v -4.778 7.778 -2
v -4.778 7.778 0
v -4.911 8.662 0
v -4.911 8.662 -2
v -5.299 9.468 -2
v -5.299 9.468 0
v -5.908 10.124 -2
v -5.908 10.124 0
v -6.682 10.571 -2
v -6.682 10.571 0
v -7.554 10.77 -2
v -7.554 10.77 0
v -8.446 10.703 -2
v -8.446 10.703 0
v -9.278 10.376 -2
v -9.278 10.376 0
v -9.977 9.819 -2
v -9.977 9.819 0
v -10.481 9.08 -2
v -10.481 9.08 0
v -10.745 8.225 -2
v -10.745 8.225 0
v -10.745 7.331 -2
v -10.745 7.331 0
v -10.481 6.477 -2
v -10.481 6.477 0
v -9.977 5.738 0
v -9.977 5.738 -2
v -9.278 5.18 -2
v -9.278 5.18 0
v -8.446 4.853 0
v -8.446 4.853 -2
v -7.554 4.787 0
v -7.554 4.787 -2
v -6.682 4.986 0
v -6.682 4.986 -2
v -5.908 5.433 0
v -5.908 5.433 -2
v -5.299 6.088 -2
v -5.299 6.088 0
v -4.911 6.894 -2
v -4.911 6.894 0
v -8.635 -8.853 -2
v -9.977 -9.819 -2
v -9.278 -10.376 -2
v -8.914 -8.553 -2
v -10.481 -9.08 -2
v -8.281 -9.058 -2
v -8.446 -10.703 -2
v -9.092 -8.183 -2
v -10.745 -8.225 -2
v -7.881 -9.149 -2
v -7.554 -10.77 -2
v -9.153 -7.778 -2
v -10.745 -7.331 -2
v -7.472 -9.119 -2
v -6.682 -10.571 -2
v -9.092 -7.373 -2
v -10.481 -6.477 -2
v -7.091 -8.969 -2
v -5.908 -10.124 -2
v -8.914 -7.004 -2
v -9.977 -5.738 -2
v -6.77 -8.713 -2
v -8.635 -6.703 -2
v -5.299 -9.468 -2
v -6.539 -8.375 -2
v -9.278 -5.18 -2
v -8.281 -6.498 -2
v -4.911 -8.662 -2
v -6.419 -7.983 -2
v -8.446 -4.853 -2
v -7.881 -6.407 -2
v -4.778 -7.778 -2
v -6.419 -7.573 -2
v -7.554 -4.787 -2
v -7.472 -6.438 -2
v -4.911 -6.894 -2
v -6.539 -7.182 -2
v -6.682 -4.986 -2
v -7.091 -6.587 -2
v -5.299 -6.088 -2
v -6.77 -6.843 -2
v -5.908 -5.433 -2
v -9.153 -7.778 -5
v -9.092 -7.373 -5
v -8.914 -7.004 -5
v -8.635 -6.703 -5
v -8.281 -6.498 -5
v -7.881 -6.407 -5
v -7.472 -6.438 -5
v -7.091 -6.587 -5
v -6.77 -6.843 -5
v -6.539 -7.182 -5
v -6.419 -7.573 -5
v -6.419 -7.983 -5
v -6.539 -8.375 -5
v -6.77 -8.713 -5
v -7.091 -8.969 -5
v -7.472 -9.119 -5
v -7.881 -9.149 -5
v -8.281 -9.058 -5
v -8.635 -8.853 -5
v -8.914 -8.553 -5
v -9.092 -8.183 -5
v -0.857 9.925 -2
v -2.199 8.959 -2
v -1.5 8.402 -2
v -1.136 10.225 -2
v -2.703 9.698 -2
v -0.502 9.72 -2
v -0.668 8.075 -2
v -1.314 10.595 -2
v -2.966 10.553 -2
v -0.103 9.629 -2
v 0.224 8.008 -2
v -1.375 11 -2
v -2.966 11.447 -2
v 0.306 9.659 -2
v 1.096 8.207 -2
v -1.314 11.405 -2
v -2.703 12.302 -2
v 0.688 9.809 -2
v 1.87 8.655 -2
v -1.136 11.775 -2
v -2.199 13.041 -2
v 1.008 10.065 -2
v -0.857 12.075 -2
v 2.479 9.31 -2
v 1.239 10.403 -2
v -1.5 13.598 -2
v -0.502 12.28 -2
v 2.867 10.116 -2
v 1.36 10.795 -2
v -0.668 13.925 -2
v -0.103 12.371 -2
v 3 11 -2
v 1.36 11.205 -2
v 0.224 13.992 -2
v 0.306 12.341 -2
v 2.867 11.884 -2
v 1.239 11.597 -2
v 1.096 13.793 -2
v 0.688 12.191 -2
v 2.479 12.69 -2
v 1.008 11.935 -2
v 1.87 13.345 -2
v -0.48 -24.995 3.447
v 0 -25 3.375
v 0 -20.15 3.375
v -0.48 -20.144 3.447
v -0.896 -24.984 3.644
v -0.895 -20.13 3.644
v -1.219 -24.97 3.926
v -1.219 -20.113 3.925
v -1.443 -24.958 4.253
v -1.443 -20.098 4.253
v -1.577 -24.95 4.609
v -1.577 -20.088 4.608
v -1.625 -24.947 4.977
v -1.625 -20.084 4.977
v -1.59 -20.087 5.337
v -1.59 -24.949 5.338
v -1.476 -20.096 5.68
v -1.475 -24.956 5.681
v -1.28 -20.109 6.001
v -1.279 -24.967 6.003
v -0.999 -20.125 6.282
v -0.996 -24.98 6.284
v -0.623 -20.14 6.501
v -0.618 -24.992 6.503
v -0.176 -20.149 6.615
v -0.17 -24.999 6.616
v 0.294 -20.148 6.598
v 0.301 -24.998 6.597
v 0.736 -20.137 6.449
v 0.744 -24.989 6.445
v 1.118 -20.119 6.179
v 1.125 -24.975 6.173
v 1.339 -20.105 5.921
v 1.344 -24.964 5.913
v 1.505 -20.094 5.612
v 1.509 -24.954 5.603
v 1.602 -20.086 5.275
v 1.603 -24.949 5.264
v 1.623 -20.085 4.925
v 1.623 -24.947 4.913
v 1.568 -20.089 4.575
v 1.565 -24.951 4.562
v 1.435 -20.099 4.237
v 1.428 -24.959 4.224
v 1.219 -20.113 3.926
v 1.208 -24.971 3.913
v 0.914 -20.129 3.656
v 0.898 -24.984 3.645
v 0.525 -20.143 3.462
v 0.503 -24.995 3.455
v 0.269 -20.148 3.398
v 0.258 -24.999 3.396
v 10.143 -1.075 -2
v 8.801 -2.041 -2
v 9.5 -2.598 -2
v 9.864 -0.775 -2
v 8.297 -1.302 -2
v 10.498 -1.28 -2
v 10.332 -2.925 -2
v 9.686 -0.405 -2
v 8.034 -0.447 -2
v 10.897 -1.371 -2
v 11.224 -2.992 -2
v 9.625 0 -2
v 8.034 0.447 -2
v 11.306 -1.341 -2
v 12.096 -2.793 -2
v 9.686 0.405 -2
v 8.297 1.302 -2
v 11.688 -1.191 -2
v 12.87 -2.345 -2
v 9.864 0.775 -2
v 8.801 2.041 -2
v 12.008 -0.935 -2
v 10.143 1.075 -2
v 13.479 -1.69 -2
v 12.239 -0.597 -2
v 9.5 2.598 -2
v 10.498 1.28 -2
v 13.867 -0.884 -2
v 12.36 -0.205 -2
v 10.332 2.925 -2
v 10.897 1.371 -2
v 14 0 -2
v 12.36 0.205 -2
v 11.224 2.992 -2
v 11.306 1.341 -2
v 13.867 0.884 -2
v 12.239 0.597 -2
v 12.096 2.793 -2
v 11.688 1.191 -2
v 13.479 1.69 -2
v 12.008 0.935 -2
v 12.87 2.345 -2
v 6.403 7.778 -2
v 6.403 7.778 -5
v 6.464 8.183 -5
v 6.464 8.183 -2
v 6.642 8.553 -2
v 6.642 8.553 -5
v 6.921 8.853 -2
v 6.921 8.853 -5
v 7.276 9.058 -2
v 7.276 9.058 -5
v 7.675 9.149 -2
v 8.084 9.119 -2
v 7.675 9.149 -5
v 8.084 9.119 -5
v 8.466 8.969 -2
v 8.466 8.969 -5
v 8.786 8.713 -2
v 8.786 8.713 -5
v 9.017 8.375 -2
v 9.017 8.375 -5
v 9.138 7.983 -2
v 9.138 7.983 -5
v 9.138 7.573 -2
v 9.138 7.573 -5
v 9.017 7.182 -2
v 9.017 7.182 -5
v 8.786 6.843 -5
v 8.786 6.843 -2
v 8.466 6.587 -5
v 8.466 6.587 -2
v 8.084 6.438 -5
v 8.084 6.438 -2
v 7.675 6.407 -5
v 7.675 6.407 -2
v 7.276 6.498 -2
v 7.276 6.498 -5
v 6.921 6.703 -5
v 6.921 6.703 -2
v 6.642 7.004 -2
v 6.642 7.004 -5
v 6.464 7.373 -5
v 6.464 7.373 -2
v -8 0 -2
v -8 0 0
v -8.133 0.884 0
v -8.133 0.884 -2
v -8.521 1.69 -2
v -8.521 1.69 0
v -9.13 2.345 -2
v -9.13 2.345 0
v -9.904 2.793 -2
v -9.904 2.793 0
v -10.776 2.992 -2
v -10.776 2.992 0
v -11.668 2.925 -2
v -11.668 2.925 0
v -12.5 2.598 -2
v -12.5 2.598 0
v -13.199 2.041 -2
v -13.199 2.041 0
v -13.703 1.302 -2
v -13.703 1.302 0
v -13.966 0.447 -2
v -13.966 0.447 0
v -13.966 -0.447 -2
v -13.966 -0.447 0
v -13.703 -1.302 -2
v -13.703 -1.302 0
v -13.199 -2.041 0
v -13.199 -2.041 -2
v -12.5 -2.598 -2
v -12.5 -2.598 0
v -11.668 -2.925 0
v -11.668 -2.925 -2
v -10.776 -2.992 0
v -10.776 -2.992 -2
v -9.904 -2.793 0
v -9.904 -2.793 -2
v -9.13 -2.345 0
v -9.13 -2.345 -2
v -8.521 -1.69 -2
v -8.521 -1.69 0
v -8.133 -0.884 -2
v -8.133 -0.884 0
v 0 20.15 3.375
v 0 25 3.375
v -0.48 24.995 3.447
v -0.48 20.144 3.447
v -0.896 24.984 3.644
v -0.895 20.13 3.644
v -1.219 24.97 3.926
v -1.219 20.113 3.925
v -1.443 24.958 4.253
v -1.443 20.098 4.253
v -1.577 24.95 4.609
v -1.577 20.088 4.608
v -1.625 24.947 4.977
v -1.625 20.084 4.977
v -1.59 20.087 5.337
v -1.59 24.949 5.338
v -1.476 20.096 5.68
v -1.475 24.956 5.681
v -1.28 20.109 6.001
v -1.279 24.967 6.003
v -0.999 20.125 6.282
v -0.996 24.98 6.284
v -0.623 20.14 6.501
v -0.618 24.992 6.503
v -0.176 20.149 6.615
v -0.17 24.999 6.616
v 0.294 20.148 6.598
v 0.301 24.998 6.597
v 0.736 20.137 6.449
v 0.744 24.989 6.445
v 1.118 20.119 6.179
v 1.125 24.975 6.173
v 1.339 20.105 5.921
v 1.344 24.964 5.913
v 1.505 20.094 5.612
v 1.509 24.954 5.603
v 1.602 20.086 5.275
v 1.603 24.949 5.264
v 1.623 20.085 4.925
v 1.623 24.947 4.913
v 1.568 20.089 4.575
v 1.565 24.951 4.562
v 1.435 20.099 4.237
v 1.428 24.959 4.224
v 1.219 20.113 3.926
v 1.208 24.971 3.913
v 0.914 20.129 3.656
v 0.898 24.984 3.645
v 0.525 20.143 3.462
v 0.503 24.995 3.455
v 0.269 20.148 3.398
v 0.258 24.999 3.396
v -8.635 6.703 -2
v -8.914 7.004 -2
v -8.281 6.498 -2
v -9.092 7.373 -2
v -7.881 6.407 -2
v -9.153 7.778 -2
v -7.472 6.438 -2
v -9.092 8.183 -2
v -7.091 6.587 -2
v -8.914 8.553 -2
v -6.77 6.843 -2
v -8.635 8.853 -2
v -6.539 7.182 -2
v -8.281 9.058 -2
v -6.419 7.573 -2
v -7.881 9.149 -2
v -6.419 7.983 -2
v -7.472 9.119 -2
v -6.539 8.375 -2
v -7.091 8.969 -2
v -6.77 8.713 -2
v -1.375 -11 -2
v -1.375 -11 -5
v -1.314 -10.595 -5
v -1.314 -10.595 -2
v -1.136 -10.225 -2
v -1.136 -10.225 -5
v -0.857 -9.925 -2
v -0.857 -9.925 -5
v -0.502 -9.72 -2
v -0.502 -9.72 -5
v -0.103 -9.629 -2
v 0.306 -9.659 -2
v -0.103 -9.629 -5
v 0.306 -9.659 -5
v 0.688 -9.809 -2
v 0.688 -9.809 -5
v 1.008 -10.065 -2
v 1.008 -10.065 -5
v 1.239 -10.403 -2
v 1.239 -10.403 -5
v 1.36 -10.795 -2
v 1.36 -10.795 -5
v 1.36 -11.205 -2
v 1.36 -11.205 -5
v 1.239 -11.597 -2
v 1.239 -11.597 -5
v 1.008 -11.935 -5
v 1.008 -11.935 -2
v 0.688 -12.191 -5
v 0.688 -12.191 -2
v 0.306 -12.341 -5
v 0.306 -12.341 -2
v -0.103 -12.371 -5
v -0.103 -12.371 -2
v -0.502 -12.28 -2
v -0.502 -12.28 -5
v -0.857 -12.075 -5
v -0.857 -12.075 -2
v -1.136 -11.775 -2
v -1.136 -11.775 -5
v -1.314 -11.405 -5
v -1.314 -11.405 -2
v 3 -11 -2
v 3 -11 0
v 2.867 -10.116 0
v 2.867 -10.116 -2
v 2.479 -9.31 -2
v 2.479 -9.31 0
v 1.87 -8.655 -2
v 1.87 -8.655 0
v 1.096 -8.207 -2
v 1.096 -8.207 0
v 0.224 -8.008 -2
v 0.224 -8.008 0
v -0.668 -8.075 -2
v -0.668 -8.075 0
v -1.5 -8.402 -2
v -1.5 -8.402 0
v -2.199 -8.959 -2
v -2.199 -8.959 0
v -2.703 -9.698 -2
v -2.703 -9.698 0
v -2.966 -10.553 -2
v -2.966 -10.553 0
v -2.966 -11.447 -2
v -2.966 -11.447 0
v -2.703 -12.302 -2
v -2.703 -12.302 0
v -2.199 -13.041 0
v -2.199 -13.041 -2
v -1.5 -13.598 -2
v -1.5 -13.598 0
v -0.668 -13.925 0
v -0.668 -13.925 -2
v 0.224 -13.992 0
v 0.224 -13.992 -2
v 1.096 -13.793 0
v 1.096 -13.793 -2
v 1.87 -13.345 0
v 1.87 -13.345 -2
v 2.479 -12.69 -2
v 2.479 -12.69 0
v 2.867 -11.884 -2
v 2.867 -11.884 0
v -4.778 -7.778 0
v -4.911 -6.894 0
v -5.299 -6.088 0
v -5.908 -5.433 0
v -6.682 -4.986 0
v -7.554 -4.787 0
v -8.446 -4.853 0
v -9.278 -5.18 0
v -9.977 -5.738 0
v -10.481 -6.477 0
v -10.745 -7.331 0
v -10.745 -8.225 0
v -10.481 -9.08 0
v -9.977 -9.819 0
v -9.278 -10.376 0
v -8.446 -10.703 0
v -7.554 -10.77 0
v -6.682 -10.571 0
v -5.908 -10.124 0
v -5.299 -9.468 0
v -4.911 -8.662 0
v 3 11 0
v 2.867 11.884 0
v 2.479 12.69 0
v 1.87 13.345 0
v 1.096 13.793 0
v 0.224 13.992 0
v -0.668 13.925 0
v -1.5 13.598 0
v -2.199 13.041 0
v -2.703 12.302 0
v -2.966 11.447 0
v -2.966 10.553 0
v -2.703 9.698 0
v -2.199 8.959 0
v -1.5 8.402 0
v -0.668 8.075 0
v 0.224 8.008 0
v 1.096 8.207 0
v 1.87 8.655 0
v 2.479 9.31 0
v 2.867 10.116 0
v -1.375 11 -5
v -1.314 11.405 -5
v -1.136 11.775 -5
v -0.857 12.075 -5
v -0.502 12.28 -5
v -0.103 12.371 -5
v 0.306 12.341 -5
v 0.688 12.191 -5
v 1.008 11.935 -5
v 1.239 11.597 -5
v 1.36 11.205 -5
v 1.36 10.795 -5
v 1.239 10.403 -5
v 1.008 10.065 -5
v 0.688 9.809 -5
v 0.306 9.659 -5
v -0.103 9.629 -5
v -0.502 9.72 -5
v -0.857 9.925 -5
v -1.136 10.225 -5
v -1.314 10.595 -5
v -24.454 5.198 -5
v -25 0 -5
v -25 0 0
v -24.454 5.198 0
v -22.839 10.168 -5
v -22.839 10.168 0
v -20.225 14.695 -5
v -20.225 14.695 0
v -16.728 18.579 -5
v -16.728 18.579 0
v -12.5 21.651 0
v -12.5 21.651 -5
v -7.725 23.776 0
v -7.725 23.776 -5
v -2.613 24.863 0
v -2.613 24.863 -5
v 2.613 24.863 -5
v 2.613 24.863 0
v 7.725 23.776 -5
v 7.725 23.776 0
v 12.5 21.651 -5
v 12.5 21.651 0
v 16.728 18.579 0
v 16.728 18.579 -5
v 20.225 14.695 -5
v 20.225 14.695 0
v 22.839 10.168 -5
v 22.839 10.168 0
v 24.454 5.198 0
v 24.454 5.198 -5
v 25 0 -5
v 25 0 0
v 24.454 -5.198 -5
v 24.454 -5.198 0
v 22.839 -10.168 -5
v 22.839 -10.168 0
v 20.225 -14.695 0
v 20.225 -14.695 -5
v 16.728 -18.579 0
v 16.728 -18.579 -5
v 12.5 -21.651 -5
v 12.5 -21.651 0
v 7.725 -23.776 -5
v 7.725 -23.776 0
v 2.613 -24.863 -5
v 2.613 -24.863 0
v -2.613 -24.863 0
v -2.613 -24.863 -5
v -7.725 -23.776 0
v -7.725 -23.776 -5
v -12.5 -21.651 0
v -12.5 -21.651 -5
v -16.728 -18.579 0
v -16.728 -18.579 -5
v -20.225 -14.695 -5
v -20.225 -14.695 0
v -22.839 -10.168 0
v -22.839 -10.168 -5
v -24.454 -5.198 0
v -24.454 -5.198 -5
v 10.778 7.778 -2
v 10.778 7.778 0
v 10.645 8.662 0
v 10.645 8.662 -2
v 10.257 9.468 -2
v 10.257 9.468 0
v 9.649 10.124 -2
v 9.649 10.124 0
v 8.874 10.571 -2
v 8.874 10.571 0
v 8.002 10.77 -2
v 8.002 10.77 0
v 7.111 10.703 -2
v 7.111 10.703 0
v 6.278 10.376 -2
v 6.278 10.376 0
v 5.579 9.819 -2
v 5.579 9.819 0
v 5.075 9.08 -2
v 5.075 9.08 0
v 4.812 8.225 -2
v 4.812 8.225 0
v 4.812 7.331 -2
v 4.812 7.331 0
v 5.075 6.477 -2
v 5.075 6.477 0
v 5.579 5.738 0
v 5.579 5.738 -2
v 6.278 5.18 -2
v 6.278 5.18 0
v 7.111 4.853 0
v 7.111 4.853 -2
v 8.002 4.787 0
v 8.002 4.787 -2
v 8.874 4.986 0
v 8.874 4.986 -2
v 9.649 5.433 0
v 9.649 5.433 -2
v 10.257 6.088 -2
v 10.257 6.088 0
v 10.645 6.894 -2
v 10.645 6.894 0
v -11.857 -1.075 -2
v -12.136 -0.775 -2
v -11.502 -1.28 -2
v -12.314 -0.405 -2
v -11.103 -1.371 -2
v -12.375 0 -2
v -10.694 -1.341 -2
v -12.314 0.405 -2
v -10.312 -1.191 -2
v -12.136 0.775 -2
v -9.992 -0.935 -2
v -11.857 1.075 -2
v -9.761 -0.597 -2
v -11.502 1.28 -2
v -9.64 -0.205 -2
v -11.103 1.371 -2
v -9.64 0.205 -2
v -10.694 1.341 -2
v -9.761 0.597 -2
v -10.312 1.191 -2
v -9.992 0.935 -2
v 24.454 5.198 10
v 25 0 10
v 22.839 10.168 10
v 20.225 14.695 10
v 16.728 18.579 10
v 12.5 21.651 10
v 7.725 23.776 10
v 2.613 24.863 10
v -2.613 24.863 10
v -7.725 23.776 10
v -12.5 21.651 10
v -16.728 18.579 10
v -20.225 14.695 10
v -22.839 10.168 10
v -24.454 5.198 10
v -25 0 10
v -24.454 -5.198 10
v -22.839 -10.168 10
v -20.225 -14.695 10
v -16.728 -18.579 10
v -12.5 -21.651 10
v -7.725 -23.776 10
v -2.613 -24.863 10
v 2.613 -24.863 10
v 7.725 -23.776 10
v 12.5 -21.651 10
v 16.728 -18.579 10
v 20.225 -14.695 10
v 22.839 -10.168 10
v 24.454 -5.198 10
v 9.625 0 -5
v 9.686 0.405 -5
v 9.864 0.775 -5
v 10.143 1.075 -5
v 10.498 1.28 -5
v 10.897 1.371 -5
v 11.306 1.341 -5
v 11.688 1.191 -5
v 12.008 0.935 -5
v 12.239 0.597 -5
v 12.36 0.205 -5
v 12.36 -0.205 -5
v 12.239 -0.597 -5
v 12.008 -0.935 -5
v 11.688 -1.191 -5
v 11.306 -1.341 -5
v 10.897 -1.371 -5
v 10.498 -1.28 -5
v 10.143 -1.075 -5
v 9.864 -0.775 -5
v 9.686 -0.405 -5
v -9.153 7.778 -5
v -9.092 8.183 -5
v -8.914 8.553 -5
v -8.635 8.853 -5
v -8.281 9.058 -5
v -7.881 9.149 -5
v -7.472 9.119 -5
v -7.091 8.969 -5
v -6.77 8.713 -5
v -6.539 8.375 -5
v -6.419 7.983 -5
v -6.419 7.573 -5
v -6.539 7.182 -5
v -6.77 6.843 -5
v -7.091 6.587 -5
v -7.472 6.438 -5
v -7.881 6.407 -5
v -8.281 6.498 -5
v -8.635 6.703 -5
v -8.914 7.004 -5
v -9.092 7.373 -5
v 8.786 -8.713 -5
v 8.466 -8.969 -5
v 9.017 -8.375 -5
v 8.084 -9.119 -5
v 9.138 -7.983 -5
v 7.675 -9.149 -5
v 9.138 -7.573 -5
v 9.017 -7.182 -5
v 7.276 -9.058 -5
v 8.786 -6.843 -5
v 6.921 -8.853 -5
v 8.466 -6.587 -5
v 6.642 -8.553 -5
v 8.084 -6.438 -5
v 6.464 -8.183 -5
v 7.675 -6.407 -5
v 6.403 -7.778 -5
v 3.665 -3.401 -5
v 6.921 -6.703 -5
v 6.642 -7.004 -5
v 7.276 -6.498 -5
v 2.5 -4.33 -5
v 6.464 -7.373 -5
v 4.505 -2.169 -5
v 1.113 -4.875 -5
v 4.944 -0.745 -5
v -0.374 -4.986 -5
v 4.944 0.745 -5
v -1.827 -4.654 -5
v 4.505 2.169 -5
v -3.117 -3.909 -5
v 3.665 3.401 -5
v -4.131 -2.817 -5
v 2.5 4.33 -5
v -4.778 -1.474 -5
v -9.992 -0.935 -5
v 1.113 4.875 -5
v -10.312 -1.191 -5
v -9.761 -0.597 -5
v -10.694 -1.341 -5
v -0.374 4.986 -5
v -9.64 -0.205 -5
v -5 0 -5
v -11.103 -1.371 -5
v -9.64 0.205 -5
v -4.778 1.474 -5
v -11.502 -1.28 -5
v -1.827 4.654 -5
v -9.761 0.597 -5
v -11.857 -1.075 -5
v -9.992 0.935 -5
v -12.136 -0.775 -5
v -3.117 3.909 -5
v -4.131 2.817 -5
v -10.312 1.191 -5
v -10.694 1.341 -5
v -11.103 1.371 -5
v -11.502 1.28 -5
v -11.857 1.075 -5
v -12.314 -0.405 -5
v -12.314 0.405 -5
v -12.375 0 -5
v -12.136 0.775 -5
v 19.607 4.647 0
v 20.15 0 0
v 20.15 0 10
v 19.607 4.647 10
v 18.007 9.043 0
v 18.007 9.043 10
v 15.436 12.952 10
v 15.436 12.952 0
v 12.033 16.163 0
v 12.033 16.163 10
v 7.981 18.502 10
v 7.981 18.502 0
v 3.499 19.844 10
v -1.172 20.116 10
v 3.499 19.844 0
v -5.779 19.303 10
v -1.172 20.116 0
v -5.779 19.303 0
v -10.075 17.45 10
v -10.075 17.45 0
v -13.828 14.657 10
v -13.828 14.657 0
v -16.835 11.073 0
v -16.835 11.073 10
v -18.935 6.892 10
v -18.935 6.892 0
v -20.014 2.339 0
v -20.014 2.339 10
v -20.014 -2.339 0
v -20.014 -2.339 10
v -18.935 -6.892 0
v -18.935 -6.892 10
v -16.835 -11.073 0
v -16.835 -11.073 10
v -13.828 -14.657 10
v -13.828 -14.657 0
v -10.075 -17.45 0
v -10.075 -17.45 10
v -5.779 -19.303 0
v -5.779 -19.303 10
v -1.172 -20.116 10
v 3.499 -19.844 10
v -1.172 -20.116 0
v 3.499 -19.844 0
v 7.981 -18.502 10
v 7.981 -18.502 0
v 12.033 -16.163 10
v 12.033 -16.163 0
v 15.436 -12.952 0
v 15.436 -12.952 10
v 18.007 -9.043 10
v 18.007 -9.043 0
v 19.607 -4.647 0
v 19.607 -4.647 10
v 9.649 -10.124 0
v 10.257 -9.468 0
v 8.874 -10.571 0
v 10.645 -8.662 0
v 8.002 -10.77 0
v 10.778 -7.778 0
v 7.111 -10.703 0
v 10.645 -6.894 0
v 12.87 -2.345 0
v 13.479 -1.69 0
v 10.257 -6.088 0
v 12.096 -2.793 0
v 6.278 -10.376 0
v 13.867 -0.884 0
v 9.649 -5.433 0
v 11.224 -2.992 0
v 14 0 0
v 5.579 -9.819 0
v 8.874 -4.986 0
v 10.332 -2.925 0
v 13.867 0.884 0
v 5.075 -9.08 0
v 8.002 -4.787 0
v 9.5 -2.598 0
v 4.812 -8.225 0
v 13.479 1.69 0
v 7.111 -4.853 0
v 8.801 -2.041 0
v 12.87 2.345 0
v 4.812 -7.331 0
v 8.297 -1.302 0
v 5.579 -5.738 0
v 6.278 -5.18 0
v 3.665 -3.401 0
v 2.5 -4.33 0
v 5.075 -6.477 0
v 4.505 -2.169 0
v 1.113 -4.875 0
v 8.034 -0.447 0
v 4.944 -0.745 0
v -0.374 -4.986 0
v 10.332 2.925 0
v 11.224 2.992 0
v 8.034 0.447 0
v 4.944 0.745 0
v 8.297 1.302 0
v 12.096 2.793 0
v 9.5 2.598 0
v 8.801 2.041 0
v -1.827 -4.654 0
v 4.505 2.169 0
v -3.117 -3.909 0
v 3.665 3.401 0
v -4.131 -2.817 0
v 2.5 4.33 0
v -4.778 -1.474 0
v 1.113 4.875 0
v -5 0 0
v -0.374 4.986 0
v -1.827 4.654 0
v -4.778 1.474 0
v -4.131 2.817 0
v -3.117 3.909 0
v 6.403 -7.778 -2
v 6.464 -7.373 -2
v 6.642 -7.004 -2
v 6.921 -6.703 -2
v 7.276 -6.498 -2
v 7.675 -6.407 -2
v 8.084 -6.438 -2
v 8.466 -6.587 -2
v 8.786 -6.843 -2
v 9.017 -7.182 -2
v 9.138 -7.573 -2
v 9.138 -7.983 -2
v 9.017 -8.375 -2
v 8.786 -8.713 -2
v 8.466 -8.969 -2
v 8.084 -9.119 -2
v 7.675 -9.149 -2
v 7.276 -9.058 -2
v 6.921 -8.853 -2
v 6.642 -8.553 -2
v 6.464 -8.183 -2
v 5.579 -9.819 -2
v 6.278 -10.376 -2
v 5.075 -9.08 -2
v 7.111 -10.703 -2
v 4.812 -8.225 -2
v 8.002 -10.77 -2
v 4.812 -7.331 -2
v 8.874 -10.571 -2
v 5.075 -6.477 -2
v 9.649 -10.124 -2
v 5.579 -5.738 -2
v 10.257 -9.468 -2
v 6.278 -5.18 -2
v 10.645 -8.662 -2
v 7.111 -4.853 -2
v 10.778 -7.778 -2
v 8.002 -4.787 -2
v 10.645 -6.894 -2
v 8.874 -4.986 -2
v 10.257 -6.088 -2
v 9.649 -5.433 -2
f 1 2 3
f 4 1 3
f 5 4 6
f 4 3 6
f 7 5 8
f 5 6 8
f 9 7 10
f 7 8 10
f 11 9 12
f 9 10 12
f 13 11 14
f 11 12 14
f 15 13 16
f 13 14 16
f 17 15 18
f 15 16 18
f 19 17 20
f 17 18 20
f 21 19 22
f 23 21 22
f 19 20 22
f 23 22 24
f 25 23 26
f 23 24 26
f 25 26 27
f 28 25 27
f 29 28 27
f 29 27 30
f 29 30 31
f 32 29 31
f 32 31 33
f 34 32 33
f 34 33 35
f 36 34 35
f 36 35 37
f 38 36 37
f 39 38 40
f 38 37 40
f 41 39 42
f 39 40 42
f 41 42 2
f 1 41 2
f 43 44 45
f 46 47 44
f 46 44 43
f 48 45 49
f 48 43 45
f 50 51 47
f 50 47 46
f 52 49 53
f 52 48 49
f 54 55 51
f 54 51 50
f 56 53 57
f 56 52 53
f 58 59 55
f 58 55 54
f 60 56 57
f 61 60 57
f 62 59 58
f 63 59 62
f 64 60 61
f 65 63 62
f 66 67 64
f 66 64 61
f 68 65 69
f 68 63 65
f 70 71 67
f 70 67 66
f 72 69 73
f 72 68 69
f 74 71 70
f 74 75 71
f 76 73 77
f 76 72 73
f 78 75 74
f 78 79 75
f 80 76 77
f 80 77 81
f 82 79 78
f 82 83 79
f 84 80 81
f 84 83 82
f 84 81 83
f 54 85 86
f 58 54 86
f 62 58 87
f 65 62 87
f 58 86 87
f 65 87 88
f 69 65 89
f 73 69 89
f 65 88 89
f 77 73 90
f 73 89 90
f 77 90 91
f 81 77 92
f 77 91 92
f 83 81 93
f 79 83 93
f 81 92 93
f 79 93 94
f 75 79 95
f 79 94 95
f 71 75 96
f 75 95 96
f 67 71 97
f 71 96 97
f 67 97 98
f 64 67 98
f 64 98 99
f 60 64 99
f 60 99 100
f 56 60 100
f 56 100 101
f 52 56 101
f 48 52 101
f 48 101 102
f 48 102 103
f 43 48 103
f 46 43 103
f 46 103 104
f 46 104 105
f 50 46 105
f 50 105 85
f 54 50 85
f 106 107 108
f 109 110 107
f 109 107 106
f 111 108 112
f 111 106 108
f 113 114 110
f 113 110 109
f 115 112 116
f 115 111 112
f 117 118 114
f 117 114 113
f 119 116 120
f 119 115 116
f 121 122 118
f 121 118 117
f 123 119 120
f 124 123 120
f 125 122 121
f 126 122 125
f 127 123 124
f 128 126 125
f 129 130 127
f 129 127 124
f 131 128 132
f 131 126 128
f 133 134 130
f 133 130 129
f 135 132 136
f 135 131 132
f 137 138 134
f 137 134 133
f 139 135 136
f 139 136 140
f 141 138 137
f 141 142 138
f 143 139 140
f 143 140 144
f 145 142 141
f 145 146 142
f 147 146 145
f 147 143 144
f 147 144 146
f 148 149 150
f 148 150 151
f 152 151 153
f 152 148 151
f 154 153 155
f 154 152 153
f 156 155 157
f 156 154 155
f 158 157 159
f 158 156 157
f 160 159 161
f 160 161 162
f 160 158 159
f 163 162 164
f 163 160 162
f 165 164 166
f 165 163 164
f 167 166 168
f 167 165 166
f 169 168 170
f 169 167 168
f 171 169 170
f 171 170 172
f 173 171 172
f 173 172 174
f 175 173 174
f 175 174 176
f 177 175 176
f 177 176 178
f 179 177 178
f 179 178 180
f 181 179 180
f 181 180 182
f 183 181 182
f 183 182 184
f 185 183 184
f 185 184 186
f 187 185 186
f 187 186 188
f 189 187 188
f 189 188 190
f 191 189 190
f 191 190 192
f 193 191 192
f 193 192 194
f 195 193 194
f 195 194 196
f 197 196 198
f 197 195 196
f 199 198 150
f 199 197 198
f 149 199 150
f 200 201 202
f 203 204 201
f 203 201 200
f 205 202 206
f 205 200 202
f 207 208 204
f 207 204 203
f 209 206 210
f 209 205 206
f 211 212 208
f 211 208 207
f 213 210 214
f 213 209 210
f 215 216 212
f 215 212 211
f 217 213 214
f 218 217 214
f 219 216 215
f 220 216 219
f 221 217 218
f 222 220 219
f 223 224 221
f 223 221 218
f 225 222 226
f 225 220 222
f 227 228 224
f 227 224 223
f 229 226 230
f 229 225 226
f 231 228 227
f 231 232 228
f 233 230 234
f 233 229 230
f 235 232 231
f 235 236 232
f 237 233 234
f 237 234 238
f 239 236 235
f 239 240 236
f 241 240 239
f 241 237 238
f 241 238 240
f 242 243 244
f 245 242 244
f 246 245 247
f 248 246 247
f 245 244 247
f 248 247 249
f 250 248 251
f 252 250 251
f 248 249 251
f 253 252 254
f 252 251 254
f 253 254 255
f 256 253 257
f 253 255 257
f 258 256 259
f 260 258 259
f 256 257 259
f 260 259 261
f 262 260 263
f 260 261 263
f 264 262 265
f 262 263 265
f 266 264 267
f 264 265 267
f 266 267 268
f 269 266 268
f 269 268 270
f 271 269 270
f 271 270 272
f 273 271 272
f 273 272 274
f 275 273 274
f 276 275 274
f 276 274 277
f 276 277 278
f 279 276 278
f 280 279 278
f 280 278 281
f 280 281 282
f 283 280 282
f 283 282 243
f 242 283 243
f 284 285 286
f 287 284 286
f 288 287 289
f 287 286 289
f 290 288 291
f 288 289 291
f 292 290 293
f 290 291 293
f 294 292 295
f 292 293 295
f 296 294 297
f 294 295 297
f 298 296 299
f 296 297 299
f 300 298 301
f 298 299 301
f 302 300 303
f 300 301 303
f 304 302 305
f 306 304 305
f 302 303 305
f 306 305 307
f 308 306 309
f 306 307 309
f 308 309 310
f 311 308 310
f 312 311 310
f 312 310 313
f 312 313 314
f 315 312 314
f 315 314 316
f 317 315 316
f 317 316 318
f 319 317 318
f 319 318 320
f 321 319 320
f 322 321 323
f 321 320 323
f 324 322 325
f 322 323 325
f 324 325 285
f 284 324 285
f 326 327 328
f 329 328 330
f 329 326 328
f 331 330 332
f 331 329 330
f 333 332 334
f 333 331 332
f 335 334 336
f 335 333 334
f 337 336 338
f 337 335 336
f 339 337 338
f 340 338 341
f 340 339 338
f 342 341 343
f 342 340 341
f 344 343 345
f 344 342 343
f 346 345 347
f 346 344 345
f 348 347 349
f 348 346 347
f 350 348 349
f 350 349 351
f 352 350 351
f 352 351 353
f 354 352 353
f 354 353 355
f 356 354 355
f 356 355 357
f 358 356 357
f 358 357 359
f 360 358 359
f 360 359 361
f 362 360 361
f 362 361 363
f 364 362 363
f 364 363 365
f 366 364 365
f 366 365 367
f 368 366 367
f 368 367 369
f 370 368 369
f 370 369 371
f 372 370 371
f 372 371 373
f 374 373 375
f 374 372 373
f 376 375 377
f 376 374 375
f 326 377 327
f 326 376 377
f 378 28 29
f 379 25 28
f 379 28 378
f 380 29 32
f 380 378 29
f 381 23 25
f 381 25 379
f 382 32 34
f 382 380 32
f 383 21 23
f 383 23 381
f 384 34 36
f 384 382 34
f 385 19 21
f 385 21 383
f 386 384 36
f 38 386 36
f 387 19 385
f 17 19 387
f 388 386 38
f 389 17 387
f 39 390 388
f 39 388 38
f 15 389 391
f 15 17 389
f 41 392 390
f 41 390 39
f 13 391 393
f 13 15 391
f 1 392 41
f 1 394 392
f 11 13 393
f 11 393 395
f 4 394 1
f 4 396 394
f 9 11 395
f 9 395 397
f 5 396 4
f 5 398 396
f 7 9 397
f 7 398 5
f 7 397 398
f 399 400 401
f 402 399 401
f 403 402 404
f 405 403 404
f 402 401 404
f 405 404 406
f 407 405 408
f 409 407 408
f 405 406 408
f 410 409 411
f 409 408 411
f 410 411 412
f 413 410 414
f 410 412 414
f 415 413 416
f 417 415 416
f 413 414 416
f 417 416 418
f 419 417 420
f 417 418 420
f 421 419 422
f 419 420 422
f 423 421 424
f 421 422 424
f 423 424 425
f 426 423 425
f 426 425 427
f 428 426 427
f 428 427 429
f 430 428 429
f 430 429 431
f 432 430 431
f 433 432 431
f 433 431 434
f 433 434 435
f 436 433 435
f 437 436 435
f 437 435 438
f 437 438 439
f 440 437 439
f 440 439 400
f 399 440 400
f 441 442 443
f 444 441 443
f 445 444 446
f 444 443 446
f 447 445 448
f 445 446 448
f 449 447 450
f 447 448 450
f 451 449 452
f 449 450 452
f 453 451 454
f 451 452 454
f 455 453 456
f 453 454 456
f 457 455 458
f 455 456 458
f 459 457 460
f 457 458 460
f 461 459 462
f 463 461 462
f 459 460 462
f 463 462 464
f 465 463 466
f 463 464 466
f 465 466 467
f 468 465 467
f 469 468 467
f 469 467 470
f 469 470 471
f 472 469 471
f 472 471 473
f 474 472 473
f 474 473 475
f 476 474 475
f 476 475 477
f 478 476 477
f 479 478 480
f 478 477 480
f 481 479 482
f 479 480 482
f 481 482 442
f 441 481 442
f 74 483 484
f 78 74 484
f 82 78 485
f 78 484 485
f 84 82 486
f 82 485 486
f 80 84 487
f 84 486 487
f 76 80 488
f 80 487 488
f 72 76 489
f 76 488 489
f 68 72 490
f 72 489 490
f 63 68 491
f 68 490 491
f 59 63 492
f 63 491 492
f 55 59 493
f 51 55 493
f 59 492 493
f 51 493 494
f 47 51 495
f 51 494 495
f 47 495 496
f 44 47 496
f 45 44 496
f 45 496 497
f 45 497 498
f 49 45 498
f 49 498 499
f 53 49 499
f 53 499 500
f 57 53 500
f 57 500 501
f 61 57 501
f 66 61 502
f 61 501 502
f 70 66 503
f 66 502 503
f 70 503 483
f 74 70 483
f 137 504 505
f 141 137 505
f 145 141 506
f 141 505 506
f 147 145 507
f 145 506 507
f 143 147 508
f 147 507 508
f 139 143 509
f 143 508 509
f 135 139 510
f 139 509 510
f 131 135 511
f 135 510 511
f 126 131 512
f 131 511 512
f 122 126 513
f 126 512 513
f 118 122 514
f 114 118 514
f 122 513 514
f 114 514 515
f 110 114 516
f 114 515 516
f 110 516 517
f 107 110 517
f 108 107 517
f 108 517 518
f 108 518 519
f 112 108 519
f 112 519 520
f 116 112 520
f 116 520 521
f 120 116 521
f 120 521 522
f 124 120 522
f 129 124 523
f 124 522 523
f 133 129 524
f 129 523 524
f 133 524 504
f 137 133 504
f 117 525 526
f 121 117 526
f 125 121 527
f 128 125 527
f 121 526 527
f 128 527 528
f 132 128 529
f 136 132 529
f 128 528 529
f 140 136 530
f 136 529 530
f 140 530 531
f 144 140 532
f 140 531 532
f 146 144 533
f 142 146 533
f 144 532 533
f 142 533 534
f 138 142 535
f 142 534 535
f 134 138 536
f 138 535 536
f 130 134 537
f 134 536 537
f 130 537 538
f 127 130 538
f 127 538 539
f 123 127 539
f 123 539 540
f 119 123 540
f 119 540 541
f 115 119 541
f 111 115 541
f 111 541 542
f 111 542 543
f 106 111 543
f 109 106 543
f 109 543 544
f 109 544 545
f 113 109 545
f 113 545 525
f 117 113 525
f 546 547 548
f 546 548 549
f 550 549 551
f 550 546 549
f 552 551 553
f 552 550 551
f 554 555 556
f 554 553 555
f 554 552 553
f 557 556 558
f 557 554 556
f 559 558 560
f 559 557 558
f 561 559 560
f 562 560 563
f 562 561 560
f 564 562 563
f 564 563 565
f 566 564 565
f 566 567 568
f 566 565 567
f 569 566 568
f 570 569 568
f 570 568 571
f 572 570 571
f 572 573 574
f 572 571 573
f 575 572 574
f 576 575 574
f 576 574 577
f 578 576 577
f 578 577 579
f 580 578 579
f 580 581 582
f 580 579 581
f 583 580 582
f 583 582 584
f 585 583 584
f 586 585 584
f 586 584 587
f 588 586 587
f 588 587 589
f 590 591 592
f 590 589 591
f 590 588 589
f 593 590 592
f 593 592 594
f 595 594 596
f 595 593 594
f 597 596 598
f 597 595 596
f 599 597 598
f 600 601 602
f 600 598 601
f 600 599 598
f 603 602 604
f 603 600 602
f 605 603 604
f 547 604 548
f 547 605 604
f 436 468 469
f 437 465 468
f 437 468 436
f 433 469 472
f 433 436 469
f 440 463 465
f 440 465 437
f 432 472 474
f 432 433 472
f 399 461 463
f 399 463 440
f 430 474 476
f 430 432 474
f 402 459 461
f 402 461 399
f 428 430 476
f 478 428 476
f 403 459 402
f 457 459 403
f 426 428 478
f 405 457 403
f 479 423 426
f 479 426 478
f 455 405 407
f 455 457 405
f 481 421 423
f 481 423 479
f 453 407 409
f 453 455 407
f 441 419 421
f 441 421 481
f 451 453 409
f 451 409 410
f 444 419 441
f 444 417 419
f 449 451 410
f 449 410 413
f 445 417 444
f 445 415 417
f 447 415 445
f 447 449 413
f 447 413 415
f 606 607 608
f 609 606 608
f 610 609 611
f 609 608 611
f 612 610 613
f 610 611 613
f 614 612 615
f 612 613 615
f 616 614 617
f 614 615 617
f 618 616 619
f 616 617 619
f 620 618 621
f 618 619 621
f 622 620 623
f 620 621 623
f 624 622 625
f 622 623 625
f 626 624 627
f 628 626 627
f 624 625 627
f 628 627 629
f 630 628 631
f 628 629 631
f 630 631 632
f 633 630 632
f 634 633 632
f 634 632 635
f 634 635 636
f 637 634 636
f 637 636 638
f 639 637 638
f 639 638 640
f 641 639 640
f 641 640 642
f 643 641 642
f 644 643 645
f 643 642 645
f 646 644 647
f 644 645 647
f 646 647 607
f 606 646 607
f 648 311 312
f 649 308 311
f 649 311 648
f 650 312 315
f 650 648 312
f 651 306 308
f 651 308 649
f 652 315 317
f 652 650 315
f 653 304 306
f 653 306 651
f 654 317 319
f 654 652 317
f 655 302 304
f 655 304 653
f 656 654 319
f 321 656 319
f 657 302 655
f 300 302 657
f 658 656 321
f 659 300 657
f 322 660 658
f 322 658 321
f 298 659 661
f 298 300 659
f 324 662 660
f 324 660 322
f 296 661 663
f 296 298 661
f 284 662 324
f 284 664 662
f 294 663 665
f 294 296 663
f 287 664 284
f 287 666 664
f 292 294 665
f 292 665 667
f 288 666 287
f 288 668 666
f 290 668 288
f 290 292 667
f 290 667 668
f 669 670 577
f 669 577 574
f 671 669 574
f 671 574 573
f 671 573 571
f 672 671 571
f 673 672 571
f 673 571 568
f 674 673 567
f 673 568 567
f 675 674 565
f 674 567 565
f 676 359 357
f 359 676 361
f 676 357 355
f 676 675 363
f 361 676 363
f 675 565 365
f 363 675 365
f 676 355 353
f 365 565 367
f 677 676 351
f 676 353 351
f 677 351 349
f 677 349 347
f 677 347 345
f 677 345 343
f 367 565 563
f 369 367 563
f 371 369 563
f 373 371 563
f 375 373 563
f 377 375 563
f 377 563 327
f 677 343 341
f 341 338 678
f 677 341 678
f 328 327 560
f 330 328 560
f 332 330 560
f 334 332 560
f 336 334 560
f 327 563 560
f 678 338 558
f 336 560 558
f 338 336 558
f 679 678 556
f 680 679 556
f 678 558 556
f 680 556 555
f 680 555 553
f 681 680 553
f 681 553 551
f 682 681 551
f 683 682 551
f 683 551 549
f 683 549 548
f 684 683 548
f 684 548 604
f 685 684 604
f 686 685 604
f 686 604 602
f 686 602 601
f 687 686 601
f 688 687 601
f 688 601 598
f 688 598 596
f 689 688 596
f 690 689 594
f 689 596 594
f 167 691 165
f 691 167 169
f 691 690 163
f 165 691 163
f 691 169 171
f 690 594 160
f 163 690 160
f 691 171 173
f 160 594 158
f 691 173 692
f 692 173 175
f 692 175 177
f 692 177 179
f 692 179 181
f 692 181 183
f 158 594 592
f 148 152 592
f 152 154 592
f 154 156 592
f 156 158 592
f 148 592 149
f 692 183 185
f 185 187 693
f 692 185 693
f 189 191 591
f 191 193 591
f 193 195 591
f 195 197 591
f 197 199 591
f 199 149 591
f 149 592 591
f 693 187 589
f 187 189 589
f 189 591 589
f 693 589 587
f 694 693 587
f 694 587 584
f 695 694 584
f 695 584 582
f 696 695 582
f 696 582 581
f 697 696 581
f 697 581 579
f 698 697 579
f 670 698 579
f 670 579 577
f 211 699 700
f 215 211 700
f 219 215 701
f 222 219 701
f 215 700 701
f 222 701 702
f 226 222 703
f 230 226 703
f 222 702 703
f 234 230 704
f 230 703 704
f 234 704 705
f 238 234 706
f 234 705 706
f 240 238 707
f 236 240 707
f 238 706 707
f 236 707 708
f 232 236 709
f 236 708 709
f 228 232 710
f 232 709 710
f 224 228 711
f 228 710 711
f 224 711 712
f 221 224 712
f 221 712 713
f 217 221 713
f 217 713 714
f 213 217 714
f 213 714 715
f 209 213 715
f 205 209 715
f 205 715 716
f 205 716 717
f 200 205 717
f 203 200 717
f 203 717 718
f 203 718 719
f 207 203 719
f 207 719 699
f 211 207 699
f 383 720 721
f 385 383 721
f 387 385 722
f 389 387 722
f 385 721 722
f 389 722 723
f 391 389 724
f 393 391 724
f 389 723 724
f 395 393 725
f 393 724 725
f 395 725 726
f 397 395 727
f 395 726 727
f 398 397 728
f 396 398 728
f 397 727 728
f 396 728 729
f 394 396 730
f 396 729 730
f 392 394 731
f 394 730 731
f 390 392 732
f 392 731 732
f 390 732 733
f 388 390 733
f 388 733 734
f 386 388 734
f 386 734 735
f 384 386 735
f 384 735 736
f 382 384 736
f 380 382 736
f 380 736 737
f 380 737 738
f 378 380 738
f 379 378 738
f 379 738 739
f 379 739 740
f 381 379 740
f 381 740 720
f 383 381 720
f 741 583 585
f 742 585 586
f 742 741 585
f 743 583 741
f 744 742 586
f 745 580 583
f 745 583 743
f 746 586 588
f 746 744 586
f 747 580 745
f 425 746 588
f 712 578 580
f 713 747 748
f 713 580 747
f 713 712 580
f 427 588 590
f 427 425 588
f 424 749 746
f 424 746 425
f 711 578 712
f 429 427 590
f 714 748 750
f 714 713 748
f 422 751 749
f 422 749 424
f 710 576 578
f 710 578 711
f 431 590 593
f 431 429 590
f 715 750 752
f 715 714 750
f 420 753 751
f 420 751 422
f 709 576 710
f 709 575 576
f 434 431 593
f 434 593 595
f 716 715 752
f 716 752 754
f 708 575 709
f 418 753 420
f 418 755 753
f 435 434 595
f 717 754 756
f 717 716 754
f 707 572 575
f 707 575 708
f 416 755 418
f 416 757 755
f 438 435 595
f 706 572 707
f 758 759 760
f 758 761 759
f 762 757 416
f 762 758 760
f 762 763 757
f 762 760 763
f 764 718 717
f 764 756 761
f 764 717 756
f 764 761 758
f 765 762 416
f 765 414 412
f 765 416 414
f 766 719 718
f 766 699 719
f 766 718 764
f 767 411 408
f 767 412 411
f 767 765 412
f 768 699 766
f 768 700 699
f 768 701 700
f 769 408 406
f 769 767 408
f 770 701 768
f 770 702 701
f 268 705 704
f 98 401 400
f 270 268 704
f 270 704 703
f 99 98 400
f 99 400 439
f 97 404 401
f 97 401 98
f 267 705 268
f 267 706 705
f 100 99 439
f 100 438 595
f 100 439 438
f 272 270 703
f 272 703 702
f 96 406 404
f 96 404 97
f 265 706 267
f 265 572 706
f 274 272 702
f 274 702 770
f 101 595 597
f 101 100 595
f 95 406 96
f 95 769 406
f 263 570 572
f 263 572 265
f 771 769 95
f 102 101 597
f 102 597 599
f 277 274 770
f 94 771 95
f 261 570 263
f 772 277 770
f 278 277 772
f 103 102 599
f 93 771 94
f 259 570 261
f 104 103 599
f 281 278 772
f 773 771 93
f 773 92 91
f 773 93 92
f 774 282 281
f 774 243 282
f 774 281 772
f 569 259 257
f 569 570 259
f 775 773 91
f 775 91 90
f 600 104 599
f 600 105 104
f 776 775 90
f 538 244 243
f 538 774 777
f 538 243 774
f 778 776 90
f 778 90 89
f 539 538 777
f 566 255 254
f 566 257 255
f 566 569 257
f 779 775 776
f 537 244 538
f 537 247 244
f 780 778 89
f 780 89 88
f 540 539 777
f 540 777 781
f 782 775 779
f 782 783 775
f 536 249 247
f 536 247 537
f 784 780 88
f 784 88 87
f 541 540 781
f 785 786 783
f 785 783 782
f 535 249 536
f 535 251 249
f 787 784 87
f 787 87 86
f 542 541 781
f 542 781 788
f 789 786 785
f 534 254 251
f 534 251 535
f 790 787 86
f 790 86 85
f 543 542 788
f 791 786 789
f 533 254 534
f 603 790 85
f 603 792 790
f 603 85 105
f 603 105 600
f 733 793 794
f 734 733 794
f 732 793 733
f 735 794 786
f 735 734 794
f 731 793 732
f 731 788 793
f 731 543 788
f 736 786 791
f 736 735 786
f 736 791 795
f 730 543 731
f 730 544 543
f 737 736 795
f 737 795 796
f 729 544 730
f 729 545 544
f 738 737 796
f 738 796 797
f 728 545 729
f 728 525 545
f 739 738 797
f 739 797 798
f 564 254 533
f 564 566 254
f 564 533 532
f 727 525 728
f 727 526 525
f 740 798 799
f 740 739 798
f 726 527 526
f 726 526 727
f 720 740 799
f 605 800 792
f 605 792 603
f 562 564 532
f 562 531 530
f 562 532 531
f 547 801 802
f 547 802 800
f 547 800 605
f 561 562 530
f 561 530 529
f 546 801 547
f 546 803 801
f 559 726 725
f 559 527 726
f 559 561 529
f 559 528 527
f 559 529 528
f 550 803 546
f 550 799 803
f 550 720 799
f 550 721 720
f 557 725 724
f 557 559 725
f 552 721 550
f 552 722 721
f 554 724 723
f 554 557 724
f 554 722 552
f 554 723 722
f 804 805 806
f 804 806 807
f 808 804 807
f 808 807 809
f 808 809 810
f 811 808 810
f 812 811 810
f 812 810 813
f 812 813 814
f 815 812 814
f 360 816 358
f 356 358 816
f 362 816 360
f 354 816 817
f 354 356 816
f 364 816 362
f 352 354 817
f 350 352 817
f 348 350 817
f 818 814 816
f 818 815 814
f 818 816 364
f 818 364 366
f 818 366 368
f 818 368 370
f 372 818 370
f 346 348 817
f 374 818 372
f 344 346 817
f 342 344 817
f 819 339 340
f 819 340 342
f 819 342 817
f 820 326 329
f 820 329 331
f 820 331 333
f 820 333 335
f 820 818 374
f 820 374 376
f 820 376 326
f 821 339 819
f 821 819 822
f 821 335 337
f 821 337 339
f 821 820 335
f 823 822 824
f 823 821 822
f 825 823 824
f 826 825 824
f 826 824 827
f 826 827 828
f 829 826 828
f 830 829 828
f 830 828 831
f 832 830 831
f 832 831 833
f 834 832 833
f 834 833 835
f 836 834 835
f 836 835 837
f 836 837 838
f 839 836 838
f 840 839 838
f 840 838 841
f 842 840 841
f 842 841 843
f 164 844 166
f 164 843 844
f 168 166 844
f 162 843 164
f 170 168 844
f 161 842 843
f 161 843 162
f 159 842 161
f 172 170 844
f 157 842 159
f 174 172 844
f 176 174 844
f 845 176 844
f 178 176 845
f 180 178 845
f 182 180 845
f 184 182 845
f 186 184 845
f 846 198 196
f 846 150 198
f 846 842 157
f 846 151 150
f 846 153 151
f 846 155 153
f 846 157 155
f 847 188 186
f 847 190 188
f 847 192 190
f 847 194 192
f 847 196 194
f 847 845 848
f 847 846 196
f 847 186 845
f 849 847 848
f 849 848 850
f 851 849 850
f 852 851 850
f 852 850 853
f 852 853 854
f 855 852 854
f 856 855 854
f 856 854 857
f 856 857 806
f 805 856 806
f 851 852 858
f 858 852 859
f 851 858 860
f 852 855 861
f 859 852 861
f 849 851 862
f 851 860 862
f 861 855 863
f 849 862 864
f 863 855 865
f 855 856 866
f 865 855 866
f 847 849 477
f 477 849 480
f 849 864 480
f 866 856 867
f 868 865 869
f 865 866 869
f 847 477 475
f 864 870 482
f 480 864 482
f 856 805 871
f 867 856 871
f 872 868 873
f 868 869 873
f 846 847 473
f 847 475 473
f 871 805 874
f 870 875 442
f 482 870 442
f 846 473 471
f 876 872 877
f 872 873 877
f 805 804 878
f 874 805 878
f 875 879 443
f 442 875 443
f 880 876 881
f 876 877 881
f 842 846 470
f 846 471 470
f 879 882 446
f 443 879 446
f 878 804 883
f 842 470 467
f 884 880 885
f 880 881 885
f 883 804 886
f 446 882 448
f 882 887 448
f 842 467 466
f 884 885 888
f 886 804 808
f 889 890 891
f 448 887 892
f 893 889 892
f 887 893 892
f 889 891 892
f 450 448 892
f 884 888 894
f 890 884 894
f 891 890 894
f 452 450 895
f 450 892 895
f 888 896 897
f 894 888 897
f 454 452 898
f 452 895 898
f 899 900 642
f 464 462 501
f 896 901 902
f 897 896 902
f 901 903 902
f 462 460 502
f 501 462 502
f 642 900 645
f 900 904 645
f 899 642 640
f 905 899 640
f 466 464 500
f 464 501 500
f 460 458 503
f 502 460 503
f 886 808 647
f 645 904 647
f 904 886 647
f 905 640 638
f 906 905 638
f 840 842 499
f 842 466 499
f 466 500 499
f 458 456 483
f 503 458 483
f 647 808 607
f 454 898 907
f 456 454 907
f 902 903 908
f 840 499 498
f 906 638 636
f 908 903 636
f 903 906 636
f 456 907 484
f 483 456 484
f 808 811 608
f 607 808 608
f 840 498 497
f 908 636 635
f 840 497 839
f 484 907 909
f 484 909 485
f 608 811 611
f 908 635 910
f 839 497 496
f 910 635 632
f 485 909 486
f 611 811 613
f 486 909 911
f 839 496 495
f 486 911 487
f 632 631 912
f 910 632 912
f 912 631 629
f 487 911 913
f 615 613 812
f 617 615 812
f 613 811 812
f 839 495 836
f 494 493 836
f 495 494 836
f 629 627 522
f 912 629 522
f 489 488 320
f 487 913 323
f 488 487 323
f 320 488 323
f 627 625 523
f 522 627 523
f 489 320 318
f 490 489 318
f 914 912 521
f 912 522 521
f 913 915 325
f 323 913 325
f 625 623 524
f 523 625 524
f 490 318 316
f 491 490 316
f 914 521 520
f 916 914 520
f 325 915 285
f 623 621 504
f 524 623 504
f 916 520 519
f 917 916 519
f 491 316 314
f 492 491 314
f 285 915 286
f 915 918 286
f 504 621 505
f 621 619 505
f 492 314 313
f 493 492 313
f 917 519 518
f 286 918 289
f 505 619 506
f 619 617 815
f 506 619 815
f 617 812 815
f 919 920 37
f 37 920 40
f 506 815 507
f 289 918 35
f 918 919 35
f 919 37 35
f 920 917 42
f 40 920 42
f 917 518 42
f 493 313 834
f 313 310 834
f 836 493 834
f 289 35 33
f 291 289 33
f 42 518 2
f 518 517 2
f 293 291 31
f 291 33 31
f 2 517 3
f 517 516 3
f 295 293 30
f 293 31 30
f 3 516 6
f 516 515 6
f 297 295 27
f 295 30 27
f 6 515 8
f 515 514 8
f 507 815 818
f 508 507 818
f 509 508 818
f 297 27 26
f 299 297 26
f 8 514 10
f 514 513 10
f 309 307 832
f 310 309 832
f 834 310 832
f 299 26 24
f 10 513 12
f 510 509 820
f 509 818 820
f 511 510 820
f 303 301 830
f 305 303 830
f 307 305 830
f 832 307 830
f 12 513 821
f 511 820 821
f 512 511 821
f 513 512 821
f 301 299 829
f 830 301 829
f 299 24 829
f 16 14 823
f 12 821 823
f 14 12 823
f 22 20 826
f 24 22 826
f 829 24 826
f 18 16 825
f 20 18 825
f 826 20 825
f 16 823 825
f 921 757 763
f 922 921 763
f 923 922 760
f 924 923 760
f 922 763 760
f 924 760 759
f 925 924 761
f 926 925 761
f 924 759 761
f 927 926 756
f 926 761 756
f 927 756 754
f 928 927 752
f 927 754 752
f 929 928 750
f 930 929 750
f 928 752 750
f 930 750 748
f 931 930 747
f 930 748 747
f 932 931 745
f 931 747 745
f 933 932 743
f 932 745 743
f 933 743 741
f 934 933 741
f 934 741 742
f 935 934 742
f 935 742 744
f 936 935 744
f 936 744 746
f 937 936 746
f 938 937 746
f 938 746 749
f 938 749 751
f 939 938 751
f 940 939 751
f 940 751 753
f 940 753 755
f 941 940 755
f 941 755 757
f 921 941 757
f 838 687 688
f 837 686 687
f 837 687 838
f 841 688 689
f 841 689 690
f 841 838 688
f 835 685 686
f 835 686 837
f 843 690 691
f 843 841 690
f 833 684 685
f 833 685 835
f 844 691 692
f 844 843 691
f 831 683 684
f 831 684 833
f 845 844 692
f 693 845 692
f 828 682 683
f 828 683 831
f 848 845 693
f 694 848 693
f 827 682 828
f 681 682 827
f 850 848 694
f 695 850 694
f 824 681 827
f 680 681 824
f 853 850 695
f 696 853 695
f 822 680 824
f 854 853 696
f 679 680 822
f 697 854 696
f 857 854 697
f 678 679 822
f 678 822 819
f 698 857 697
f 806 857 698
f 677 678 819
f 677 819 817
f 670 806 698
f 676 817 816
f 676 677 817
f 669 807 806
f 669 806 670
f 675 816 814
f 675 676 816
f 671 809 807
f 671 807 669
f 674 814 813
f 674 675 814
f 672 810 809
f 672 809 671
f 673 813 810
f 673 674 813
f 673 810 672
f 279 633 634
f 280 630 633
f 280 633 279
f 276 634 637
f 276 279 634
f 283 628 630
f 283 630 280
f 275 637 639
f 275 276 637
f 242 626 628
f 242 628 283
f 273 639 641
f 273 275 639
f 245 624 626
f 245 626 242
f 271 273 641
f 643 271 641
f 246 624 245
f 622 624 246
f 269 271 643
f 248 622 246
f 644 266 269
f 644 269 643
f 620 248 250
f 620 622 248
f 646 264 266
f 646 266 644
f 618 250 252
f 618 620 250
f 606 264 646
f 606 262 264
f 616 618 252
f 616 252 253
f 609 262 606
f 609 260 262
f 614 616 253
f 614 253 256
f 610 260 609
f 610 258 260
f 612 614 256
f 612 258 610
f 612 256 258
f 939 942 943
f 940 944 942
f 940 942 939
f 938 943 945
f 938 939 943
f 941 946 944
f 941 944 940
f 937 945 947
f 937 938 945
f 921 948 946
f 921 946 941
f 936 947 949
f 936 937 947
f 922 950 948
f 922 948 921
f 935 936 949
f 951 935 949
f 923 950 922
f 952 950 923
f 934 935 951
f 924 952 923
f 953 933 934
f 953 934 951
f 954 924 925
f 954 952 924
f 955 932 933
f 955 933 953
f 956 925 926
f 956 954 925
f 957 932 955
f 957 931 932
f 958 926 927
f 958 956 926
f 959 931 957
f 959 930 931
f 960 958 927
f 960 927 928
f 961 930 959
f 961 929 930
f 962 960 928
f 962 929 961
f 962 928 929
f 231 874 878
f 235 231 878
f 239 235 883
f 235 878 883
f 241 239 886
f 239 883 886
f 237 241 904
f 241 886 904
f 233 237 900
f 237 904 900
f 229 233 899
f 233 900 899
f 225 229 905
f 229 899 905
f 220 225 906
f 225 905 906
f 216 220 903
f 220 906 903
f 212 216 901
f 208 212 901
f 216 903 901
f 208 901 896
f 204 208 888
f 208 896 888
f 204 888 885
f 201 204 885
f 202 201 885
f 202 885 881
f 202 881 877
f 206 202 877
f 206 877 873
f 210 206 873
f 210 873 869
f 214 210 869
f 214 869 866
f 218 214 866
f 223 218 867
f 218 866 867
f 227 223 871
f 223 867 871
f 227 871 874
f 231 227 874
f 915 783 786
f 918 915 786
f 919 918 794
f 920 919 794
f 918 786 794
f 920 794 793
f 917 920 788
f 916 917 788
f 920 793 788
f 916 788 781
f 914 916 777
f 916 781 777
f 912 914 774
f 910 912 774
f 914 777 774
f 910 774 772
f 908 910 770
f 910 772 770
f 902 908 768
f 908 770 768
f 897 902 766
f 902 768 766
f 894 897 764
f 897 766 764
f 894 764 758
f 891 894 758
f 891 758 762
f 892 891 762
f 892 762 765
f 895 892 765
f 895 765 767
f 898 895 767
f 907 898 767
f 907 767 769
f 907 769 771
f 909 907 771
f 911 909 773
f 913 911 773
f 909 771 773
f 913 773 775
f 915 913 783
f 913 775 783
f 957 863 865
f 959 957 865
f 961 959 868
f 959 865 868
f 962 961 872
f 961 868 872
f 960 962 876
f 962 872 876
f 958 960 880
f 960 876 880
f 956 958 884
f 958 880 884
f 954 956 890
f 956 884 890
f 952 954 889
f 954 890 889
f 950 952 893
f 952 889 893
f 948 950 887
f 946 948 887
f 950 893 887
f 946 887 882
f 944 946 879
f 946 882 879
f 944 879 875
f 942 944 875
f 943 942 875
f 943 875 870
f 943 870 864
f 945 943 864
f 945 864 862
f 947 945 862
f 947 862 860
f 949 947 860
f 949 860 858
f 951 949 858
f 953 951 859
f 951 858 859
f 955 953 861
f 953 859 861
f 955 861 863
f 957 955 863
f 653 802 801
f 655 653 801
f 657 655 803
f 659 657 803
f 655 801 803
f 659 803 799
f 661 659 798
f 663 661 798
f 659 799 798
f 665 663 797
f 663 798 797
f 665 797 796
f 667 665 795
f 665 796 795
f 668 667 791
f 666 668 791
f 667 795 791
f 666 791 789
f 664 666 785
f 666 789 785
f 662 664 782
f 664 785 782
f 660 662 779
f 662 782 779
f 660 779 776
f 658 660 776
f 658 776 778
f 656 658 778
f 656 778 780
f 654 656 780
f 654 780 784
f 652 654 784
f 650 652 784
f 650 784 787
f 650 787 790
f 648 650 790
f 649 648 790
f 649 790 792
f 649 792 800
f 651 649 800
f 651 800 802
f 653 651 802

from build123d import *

# Parameters (mm, degrees)
SKETCH1_R               = 25
SKETCH1_R_2             = 20.15
BOSS_EXTRUDE1_DEPTH     = 10
BOSS_EXTRUDE2_START     = 5
SKETCH2_R               = 25
SKETCH2_R_2             = 1.375
SKETCH2_R_3             = 5
BOSS_EXTRUDE2_DEPTH     = 5
SKETCH3_R               = 3
CUT_EXTRUDE1_DEPTH      = 2
CUT_EXTRUDE2_DEPTH      = 38
CUT_EXTRUDE2_DEPTH_BACK = 33
SKETCH4_R               = 1.625


with BuildPart() as part:
    # Sketch1 → Boss-Extrude1 (new body)
    with BuildSketch(Plane.XY):
        Circle(SKETCH1_R)
        Circle(SKETCH1_R_2, mode=Mode.SUBTRACT)
    extrude(amount=BOSS_EXTRUDE1_DEPTH)

    # Sketch2 → Boss-Extrude2 (add)
    with BuildSketch(Plane(origin=(0, 0, 0), x_dir=(-1, 0, 0), z_dir=(0, 0, -1)).offset(BOSS_EXTRUDE2_START)):
        Circle(SKETCH2_R)
        with Locations((-11, 0)):
            Circle(SKETCH2_R_2, mode=Mode.SUBTRACT)
        with Locations((-7.778174593, 7.778174593)):
            Circle(SKETCH2_R_2, mode=Mode.SUBTRACT)
        with Locations((0, 11)):
            Circle(SKETCH2_R_2, mode=Mode.SUBTRACT)
        with Locations((7.778174593, 7.778174593)):
            Circle(SKETCH2_R_2, mode=Mode.SUBTRACT)
        with Locations((11, 0)):
            Circle(SKETCH2_R_2, mode=Mode.SUBTRACT)
        with Locations((7.778174593, -7.778174593)):
            Circle(SKETCH2_R_2, mode=Mode.SUBTRACT)
        with Locations((0, -11)):
            Circle(SKETCH2_R_2, mode=Mode.SUBTRACT)
        with Locations((-7.778174593, -7.778174593)):
            Circle(SKETCH2_R_2, mode=Mode.SUBTRACT)
        Circle(SKETCH2_R_3, mode=Mode.SUBTRACT)
    extrude(amount=-BOSS_EXTRUDE2_DEPTH)

    # Sketch3 → Cut-Extrude1 (cut)
    with BuildSketch(Plane.XY):
        with Locations((0, 11)):
            Circle(SKETCH3_R)
        with Locations((7.778174593, 7.778174593)):
            Circle(SKETCH3_R)
        with Locations((11, 0)):
            Circle(SKETCH3_R)
        with Locations((7.778174593, -7.778174593)):
            Circle(SKETCH3_R)
        with Locations((0, -11)):
            Circle(SKETCH3_R)
        with Locations((-7.778174593, -7.778174593)):
            Circle(SKETCH3_R)
        with Locations((-11, 0)):
            Circle(SKETCH3_R)
        with Locations((-7.778174593, 7.778174593)):
            Circle(SKETCH3_R)
    extrude(amount=-CUT_EXTRUDE1_DEPTH, mode=Mode.SUBTRACT)

    # Sketch4 → Cut-Extrude2 (cut, two sides: drawn at the far end of the back side and taken through both)
    with BuildSketch(Plane(origin=(0, 0, 0), x_dir=(1, 0, 0), z_dir=(0, 1, 0)).offset(-CUT_EXTRUDE2_DEPTH_BACK)):
        with Locations(Location((0, -5, 0), (0, 0, 90))):
            Circle(SKETCH4_R)
    extrude(amount=CUT_EXTRUDE2_DEPTH + CUT_EXTRUDE2_DEPTH_BACK, mode=Mode.SUBTRACT)


solid = part.part
